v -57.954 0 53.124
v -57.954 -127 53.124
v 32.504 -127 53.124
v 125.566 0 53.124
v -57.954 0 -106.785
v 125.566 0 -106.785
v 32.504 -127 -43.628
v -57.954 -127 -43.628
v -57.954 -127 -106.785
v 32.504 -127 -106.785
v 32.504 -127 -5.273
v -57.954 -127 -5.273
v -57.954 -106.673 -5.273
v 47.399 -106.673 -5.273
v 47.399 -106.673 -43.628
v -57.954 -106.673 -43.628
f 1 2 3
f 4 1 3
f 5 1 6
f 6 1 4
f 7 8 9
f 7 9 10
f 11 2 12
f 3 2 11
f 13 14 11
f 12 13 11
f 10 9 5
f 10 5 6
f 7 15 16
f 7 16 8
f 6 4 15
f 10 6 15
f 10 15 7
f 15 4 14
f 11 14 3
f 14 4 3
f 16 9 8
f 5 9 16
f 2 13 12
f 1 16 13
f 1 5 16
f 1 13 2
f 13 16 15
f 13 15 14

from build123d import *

# Parameters (mm, degrees)
F0_W     = 183.51976946
F0_H     = 159.9090248346
F1_DEPTH = 127
F3_DEPTH = 159.9100248346
F5_DEPTH = 159.9100248346
F6_W     = 20.3265432715
F6_H     = 38.354692515
F7_DEPTH = 183.52076946


with BuildPart() as f1:
    # F0 (on Front) → F1 (new body)
    with BuildSketch(Plane.XZ):
        with Locations((33.8062848896, -26.8303751945)):
            Rectangle(F0_W, F0_H)
    extrude(amount=F1_DEPTH)

    # F2 (on face) → F3 (cut, through all)
    with BuildSketch(Plane(origin=(0, 0, -106.7848876119), x_dir=(1, 0, 0), z_dir=(0, 0, -1))):
        Polygon((61.1603185534, 201.0327279568), (125.5661696196, 0), (249.7815191746, 14.9288764223), (305.6204319, 25.561010465), align=None)
    extrude(amount=-F3_DEPTH, mode=Mode.SUBTRACT)

    # F4 (on face) → F5 (cut, through all)
    with BuildSketch(Plane.XY.offset(53.1241372228)):
        Polygon((127.3305118084, 0), (125.5661696196, 0), (32.5038395822, -127), (137.3508572578, -127), (149.5707929134, 0), align=None)
    extrude(amount=-F5_DEPTH, mode=Mode.SUBTRACT)

    # F6 (on face) → F7 (cut, through all)
    with BuildSketch(Plane(origin=(-57.9535998404, 0, 0), x_dir=(0, -1, 0), z_dir=(-1, 0, 0))):
        with Locations((116.8367283642, -24.4502548594)):
            Rectangle(F6_W, F6_H)
    extrude(amount=-F7_DEPTH, mode=Mode.SUBTRACT)


solid = f1.part
